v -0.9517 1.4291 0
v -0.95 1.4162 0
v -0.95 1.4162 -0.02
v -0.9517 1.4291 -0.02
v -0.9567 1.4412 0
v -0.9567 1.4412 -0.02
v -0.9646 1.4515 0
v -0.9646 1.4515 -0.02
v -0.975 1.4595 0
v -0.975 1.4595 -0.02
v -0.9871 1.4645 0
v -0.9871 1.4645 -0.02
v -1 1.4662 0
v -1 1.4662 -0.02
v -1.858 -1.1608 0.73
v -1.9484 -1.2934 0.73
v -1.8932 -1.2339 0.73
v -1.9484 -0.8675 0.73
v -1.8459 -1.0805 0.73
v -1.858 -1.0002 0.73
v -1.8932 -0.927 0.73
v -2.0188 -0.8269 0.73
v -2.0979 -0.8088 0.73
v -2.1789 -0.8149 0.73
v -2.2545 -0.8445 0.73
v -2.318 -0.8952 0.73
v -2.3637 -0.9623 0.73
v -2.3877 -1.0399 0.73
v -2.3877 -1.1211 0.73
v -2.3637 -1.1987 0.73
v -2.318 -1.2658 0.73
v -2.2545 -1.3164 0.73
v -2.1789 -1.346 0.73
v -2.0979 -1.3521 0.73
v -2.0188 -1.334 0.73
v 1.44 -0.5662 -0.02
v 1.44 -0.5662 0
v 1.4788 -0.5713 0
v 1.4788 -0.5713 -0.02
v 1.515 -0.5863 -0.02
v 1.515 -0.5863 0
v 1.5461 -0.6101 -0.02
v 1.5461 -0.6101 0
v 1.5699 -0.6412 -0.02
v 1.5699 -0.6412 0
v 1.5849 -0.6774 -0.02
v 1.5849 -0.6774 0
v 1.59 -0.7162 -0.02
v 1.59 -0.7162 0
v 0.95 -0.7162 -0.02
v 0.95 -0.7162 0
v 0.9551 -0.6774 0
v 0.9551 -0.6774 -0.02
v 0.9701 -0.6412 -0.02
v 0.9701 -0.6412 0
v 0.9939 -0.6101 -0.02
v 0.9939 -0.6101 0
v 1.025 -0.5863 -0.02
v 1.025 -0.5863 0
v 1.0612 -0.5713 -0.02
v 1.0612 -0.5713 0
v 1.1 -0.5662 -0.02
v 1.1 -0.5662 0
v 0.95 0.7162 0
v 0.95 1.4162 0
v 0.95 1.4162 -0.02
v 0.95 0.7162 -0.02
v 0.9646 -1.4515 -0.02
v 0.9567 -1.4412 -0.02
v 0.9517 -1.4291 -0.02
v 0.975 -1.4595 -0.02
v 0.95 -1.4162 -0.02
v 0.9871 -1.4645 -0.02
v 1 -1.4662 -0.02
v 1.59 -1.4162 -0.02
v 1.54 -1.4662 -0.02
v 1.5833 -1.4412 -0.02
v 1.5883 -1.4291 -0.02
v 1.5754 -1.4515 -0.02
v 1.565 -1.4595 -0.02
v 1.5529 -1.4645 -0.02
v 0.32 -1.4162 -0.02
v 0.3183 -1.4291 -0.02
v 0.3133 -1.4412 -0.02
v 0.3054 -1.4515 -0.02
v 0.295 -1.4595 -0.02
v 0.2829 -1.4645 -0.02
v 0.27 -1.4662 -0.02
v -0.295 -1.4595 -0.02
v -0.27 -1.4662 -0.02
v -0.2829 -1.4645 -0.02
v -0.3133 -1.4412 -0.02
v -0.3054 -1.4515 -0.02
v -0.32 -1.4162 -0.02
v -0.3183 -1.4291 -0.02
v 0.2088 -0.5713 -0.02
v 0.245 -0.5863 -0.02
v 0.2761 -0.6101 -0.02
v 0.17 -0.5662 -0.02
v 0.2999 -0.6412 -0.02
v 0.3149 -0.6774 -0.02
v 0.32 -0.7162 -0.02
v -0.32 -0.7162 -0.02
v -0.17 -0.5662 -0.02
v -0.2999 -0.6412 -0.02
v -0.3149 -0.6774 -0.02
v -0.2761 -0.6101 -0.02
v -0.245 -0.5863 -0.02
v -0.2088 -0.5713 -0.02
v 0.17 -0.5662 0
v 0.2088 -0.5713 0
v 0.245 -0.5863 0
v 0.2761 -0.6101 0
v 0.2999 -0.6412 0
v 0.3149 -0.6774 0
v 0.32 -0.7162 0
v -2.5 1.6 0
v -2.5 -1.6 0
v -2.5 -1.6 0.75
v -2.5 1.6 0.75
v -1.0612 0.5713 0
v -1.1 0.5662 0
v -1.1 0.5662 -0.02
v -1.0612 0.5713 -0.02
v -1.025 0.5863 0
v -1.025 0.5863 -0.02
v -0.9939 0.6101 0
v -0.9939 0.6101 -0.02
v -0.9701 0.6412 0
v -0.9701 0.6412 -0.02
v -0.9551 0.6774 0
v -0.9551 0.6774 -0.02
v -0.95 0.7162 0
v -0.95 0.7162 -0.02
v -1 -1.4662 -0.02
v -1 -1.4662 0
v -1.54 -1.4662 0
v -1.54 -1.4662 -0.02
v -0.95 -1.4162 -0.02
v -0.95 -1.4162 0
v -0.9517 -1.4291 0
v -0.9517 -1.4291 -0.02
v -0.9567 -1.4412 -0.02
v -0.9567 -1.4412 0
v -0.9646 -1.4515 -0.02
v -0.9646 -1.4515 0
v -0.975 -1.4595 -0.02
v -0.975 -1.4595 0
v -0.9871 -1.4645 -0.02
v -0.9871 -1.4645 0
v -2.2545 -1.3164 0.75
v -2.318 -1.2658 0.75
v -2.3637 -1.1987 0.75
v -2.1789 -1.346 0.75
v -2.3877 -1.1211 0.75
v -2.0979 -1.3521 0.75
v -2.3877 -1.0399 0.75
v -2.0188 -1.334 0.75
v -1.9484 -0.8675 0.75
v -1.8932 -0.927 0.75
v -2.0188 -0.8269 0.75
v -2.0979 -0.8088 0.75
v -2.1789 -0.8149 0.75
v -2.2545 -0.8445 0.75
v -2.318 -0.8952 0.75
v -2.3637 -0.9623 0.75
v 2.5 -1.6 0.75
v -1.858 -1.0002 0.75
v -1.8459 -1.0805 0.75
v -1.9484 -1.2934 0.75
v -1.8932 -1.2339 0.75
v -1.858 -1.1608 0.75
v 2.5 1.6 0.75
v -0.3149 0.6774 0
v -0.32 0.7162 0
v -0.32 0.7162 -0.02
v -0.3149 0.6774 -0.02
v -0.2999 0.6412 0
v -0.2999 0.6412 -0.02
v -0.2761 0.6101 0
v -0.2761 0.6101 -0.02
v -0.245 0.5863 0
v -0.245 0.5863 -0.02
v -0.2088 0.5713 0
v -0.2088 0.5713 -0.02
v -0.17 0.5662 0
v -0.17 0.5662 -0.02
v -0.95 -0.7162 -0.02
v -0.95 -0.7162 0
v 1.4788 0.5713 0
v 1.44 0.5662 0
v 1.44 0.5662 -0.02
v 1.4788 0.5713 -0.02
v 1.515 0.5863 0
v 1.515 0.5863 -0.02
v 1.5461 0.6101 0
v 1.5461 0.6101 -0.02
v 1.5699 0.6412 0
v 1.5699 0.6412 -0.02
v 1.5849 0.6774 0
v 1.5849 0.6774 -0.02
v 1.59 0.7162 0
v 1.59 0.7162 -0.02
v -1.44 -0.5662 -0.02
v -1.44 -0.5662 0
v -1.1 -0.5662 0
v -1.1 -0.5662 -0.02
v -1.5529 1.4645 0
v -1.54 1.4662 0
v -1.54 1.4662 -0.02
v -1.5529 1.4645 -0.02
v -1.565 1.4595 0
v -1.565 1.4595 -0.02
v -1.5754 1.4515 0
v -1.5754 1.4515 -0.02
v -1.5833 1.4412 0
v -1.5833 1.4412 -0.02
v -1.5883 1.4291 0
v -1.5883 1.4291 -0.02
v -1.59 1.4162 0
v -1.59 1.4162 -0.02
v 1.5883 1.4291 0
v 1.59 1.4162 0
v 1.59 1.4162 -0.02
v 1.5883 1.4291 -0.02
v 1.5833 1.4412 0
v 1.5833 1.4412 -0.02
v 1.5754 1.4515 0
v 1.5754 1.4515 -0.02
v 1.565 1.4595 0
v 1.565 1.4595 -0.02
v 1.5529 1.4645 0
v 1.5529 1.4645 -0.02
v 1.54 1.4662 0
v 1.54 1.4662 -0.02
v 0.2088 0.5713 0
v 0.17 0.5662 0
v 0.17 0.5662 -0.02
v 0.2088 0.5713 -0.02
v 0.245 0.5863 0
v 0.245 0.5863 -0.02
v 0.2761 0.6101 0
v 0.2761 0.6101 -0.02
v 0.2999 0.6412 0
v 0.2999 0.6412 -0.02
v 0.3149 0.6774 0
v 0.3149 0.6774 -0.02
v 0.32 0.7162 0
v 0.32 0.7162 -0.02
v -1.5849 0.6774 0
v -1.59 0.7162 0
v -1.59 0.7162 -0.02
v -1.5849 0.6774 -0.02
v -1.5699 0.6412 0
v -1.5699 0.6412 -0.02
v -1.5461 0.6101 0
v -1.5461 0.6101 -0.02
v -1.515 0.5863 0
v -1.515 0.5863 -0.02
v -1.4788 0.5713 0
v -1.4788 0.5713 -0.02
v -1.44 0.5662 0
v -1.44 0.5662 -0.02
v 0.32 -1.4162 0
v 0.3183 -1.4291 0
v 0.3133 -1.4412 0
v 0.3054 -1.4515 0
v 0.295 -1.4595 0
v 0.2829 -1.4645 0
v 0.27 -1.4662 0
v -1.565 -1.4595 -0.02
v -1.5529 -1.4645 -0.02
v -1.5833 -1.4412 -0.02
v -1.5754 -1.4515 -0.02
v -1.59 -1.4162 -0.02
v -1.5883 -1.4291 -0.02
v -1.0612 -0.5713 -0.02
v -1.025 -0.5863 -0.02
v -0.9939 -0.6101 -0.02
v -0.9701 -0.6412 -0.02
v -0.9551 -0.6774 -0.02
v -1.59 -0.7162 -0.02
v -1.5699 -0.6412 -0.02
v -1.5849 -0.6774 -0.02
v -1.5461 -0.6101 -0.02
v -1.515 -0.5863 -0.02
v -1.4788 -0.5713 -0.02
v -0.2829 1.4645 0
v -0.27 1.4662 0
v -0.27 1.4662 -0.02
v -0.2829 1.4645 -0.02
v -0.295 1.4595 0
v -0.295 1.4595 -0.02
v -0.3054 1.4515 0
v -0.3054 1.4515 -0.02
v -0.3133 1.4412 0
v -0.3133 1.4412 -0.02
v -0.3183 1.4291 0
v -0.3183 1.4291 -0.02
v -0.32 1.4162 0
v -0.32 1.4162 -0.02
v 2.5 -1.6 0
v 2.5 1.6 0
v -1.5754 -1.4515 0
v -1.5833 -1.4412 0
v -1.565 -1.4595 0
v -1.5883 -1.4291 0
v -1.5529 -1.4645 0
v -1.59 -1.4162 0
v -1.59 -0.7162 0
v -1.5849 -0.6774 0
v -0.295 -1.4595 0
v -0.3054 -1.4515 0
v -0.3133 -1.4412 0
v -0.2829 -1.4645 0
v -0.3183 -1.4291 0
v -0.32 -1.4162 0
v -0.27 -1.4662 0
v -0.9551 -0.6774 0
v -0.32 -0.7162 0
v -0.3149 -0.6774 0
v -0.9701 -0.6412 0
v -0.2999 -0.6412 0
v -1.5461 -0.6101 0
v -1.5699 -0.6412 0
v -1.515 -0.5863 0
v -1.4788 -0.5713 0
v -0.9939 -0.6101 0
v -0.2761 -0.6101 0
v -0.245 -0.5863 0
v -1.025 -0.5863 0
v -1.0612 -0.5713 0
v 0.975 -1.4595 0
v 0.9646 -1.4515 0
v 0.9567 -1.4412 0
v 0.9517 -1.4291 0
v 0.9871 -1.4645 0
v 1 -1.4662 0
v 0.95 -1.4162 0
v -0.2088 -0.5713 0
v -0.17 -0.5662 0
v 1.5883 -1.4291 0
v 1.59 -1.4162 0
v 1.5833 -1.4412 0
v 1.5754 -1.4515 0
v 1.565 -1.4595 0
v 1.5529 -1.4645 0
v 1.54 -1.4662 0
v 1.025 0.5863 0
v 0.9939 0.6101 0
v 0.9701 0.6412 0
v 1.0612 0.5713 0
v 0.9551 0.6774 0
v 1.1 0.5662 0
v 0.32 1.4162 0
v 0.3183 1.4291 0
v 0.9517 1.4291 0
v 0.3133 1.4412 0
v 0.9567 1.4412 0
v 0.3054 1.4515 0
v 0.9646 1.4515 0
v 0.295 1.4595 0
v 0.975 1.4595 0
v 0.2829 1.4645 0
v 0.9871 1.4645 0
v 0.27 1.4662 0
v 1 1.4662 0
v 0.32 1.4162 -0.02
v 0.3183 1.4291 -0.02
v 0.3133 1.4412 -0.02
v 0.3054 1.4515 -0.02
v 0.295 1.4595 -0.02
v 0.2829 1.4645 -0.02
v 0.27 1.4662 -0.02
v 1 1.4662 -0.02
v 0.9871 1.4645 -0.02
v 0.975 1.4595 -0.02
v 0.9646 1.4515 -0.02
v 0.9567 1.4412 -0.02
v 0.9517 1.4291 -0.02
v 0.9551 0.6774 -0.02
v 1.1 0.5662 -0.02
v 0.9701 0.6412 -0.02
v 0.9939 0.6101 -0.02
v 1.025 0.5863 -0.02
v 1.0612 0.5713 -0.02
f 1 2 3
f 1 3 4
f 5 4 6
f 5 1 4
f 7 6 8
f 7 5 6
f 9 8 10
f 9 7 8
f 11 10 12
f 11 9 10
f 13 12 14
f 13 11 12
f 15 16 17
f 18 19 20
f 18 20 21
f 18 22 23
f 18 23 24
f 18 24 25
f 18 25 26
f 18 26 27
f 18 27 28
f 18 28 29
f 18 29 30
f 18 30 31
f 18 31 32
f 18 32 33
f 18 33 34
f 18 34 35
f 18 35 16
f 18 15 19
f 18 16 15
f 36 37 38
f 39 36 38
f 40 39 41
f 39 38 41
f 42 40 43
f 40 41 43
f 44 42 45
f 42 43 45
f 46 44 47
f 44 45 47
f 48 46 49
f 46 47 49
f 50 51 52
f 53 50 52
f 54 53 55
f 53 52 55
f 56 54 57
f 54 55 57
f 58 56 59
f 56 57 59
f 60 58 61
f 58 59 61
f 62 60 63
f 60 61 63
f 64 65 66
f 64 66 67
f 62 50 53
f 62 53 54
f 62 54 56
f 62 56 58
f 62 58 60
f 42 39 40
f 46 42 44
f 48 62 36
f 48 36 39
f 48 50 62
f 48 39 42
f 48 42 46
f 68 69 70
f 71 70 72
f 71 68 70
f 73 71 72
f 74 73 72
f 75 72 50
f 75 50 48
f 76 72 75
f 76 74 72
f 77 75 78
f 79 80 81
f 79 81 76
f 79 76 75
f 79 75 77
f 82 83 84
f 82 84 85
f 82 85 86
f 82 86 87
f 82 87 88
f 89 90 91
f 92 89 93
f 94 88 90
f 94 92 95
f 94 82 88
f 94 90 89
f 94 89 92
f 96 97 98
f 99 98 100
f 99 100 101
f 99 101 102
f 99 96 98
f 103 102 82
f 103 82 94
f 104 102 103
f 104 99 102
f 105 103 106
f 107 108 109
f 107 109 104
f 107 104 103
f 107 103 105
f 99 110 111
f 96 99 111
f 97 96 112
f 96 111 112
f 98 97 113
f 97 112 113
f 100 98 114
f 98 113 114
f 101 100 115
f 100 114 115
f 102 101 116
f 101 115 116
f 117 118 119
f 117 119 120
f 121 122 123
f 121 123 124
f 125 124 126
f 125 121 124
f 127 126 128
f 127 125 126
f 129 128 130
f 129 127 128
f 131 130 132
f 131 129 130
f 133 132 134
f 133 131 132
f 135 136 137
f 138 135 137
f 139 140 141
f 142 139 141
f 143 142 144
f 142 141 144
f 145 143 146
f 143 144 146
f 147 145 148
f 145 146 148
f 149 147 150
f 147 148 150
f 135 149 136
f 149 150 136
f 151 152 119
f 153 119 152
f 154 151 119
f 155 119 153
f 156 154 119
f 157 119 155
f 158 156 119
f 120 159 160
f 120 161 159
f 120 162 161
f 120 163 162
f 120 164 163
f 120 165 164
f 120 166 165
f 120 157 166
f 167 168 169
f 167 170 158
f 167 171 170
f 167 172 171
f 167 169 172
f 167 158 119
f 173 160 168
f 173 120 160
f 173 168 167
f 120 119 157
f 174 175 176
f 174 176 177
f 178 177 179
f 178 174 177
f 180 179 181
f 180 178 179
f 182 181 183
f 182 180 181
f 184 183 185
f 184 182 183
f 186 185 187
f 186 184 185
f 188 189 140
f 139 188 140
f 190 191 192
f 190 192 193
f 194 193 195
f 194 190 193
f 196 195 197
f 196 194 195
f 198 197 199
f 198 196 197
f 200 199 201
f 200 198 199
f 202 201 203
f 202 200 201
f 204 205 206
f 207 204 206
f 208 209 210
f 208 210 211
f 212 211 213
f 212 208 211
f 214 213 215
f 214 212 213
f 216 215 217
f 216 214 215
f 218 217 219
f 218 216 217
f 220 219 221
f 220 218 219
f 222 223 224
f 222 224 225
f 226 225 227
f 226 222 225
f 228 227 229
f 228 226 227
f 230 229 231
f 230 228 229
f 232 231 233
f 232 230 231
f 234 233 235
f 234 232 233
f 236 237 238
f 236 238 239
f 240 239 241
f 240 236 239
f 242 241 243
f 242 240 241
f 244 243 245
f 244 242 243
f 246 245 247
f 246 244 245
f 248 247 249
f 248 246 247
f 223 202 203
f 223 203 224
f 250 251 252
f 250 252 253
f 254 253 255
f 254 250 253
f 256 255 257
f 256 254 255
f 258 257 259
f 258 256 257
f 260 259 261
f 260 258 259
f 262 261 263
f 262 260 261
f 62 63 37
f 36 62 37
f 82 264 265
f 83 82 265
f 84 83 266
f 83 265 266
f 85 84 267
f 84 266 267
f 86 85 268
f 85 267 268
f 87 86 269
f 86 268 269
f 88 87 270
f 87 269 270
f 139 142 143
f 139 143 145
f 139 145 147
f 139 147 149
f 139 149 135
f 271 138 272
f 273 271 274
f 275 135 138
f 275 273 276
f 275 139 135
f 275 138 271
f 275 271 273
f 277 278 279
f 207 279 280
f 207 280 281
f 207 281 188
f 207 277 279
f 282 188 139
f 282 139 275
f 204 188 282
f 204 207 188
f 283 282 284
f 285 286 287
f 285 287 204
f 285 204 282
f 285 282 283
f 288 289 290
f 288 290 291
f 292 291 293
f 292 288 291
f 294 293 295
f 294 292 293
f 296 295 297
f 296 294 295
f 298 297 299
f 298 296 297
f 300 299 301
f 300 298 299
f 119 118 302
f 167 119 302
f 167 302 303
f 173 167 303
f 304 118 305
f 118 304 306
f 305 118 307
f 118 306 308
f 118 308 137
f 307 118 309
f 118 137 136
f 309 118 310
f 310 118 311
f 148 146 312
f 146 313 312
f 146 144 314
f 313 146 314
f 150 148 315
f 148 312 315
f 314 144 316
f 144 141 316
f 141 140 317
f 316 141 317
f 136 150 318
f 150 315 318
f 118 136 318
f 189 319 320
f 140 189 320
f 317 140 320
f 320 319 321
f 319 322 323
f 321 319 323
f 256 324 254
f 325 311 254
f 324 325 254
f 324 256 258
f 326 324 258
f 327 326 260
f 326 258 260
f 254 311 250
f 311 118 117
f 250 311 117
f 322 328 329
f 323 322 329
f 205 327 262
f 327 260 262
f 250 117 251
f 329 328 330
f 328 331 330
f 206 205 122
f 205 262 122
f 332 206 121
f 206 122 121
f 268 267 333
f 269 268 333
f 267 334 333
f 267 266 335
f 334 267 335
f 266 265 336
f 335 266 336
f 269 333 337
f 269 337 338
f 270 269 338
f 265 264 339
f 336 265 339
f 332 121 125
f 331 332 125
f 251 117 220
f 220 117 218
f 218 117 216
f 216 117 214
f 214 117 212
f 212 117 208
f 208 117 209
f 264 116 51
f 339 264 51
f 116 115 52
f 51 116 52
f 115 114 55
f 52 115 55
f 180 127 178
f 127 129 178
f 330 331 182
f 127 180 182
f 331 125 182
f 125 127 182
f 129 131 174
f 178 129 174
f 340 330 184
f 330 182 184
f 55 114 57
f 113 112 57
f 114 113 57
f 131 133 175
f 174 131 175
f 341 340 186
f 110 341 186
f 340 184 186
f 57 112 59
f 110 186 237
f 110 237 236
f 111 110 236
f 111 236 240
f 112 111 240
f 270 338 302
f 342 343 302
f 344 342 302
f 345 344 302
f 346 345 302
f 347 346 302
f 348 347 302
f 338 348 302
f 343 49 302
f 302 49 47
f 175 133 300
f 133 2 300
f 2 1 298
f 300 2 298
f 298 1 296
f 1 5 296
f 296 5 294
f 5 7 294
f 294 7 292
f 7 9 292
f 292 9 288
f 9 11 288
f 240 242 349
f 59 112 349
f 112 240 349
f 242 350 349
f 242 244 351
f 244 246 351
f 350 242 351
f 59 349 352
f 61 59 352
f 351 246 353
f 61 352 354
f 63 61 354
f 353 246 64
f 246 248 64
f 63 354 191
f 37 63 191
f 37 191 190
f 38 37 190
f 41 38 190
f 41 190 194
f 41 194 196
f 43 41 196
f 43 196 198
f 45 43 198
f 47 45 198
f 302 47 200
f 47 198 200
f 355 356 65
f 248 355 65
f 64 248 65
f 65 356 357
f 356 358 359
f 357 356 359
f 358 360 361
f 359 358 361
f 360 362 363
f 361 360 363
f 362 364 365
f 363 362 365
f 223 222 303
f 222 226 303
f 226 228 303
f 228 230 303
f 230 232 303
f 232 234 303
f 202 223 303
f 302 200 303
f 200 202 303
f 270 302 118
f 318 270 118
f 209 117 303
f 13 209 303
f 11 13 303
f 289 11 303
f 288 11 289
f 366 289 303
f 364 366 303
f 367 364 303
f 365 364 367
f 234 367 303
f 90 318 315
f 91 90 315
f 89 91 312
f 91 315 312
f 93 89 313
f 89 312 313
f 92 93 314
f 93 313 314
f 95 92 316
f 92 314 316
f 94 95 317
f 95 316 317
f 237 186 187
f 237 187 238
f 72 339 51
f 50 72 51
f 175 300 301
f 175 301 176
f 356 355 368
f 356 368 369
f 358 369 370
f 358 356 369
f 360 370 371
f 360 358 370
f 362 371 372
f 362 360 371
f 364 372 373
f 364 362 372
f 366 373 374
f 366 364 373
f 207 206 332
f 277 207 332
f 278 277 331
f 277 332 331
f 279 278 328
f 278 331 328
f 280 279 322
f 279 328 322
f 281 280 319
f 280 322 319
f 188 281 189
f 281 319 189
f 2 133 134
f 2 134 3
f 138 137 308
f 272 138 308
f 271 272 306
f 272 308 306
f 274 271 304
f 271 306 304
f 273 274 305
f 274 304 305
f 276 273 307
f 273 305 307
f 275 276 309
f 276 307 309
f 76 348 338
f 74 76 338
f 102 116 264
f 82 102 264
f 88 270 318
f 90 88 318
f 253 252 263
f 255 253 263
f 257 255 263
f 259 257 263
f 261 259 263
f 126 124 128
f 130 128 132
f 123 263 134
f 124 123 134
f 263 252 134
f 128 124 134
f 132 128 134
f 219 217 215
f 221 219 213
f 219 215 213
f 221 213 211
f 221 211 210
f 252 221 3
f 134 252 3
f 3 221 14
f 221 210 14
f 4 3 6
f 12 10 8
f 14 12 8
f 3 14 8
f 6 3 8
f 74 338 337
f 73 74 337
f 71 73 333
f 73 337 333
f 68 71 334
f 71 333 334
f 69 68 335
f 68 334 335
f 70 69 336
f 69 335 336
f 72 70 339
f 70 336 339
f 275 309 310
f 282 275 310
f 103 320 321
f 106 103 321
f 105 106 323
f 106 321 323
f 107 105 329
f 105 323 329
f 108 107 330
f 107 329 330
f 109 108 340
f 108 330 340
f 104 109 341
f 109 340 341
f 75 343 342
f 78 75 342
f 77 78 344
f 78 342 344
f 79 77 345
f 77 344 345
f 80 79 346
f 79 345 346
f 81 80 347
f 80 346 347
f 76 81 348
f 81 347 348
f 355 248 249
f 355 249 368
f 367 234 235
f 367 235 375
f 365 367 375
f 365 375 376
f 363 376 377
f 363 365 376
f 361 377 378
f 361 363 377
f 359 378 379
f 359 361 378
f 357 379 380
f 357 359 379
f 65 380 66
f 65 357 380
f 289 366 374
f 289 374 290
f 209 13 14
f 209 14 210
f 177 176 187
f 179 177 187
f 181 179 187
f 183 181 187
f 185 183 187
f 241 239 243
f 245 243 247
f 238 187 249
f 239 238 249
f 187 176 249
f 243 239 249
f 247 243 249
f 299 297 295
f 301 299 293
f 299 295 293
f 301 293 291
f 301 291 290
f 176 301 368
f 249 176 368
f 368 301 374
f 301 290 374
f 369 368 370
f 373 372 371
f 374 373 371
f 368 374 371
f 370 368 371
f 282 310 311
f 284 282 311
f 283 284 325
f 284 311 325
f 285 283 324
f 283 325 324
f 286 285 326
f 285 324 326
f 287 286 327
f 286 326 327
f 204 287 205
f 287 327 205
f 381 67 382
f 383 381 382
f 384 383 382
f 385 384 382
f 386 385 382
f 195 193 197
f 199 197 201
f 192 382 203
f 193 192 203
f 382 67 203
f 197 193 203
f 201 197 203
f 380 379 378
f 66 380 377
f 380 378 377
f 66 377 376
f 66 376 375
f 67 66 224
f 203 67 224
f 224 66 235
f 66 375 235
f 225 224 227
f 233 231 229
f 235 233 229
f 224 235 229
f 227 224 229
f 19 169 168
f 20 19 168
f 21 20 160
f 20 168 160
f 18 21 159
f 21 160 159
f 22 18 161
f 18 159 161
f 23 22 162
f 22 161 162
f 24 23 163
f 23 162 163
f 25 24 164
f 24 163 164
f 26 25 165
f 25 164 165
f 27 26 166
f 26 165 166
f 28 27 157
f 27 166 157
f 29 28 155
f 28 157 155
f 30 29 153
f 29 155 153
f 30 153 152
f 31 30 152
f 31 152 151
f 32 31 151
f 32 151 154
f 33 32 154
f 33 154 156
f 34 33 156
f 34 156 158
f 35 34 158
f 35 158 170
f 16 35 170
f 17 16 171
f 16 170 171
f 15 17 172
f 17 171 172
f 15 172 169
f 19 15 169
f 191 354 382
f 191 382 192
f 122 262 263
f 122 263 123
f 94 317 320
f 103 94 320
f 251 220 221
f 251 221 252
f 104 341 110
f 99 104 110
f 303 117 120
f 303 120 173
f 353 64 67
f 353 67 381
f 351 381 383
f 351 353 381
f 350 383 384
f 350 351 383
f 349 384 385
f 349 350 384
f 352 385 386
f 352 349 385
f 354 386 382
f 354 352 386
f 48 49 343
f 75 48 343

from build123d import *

# Parameters (mm, degrees)
SKETCH1_W            = 5
SKETCH1_H            = 3.2
BOSS_EXTRUDE1_DEPTH  = 0.75
BOSS_EXTRUDE2_DEPTH  = 0.02
LPATTERN1_COUNT      = 3
LPATTERN1_PITCH      = 1.27
MIRROR1_COPY_1_DEPTH = 0.02
MIRROR1_COPY_2_DEPTH = 0.02
SKETCH3_R            = 0.272413565
CUT_EXTRUDE1_DEPTH   = 0.02


with BuildPart() as part:
    # Sketch1 → Boss-Extrude1 (new body)
    with BuildSketch(Plane.XY):
        Rectangle(SKETCH1_W, SKETCH1_H)
    extrude(amount=BOSS_EXTRUDE1_DEPTH)

    # Sketch2 → Boss-Extrude2 (add)
    with BuildSketch(Plane(origin=(0, 0, 0), x_dir=(-1, 0, 0), z_dir=(0, 0, -1))):
        with BuildLine():
            Line((-1.54, 1.466183209), (-1, 1.466183209))
            ThreePointArc((-1, 1.466183209), (-0.964644661, 1.451538548), (-0.95, 1.416183209))
            Line((-0.95, 1.416183209), (-0.95, 0.716183209))
            ThreePointArc((-0.95, 0.716183209), (-0.993933983, 0.610117192), (-1.1, 0.566183209))
            Line((-1.1, 0.566183209), (-1.44, 0.566183209))
            ThreePointArc((-1.44, 0.566183209), (-1.546066017, 0.610117192), (-1.59, 0.716183209))
            Line((-1.59, 0.716183209), (-1.59, 1.416183209))
            ThreePointArc((-1.59, 1.416183209), (-1.575355339, 1.451538548), (-1.54, 1.466183209))
        make_face()
    boss_extrude2 = extrude(amount=BOSS_EXTRUDE2_DEPTH)

    # LPattern1: Boss-Extrude2 ×3
    with Locations(*[(-i * LPATTERN1_PITCH, 0, 0) for i in range(1, LPATTERN1_COUNT)]):
        add(boss_extrude2)

    # Mirror1: Boss-Extrude2 across plane
    add(boss_extrude2.mirror(Plane.ZX))

    # Mirror1 copy 1 sketch → Mirror1 copy 1 (add)
    with BuildSketch(Plane(origin=(-1.27, 0, 0), x_dir=(-1, 0, 0), z_dir=(0, 0, -1))):
        with BuildLine():
            Line((-1.54, -1.466183209), (-1, -1.466183209))
            ThreePointArc((-1, -1.466183209), (-0.964644661, -1.451538548), (-0.95, -1.416183209))
            Line((-0.95, -1.416183209), (-0.95, -0.716183209))
            ThreePointArc((-0.95, -0.716183209), (-0.993933983, -0.610117192), (-1.1, -0.566183209))
            Line((-1.1, -0.566183209), (-1.44, -0.566183209))
            ThreePointArc((-1.44, -0.566183209), (-1.546066017, -0.610117192), (-1.59, -0.716183209))
            Line((-1.59, -0.716183209), (-1.59, -1.416183209))
            ThreePointArc((-1.59, -1.416183209), (-1.575355339, -1.451538548), (-1.54, -1.466183209))
        make_face()
    extrude(amount=MIRROR1_COPY_1_DEPTH)

    # Mirror1 copy 2 sketch → Mirror1 copy 2 (add)
    with BuildSketch(Plane(origin=(-2.54, 0, 0), x_dir=(-1, 0, 0), z_dir=(0, 0, -1))):
        with BuildLine():
            Line((-1.54, -1.466183209), (-1, -1.466183209))
            ThreePointArc((-1, -1.466183209), (-0.964644661, -1.451538548), (-0.95, -1.416183209))
            Line((-0.95, -1.416183209), (-0.95, -0.716183209))
            ThreePointArc((-0.95, -0.716183209), (-0.993933983, -0.610117192), (-1.1, -0.566183209))
            Line((-1.1, -0.566183209), (-1.44, -0.566183209))
            ThreePointArc((-1.44, -0.566183209), (-1.546066017, -0.610117192), (-1.59, -0.716183209))
            Line((-1.59, -0.716183209), (-1.59, -1.416183209))
            ThreePointArc((-1.59, -1.416183209), (-1.575355339, -1.451538548), (-1.54, -1.466183209))
        make_face()
    extrude(amount=MIRROR1_COPY_2_DEPTH)

    # Sketch3 → Cut-Extrude1 (cut)
    with BuildSketch(Plane.XY.offset(0.75)):
        with Locations((-2.118285692, -1.080463464)):
            Circle(SKETCH3_R)
    extrude(amount=-CUT_EXTRUDE1_DEPTH, mode=Mode.SUBTRACT)


solid = part.part
